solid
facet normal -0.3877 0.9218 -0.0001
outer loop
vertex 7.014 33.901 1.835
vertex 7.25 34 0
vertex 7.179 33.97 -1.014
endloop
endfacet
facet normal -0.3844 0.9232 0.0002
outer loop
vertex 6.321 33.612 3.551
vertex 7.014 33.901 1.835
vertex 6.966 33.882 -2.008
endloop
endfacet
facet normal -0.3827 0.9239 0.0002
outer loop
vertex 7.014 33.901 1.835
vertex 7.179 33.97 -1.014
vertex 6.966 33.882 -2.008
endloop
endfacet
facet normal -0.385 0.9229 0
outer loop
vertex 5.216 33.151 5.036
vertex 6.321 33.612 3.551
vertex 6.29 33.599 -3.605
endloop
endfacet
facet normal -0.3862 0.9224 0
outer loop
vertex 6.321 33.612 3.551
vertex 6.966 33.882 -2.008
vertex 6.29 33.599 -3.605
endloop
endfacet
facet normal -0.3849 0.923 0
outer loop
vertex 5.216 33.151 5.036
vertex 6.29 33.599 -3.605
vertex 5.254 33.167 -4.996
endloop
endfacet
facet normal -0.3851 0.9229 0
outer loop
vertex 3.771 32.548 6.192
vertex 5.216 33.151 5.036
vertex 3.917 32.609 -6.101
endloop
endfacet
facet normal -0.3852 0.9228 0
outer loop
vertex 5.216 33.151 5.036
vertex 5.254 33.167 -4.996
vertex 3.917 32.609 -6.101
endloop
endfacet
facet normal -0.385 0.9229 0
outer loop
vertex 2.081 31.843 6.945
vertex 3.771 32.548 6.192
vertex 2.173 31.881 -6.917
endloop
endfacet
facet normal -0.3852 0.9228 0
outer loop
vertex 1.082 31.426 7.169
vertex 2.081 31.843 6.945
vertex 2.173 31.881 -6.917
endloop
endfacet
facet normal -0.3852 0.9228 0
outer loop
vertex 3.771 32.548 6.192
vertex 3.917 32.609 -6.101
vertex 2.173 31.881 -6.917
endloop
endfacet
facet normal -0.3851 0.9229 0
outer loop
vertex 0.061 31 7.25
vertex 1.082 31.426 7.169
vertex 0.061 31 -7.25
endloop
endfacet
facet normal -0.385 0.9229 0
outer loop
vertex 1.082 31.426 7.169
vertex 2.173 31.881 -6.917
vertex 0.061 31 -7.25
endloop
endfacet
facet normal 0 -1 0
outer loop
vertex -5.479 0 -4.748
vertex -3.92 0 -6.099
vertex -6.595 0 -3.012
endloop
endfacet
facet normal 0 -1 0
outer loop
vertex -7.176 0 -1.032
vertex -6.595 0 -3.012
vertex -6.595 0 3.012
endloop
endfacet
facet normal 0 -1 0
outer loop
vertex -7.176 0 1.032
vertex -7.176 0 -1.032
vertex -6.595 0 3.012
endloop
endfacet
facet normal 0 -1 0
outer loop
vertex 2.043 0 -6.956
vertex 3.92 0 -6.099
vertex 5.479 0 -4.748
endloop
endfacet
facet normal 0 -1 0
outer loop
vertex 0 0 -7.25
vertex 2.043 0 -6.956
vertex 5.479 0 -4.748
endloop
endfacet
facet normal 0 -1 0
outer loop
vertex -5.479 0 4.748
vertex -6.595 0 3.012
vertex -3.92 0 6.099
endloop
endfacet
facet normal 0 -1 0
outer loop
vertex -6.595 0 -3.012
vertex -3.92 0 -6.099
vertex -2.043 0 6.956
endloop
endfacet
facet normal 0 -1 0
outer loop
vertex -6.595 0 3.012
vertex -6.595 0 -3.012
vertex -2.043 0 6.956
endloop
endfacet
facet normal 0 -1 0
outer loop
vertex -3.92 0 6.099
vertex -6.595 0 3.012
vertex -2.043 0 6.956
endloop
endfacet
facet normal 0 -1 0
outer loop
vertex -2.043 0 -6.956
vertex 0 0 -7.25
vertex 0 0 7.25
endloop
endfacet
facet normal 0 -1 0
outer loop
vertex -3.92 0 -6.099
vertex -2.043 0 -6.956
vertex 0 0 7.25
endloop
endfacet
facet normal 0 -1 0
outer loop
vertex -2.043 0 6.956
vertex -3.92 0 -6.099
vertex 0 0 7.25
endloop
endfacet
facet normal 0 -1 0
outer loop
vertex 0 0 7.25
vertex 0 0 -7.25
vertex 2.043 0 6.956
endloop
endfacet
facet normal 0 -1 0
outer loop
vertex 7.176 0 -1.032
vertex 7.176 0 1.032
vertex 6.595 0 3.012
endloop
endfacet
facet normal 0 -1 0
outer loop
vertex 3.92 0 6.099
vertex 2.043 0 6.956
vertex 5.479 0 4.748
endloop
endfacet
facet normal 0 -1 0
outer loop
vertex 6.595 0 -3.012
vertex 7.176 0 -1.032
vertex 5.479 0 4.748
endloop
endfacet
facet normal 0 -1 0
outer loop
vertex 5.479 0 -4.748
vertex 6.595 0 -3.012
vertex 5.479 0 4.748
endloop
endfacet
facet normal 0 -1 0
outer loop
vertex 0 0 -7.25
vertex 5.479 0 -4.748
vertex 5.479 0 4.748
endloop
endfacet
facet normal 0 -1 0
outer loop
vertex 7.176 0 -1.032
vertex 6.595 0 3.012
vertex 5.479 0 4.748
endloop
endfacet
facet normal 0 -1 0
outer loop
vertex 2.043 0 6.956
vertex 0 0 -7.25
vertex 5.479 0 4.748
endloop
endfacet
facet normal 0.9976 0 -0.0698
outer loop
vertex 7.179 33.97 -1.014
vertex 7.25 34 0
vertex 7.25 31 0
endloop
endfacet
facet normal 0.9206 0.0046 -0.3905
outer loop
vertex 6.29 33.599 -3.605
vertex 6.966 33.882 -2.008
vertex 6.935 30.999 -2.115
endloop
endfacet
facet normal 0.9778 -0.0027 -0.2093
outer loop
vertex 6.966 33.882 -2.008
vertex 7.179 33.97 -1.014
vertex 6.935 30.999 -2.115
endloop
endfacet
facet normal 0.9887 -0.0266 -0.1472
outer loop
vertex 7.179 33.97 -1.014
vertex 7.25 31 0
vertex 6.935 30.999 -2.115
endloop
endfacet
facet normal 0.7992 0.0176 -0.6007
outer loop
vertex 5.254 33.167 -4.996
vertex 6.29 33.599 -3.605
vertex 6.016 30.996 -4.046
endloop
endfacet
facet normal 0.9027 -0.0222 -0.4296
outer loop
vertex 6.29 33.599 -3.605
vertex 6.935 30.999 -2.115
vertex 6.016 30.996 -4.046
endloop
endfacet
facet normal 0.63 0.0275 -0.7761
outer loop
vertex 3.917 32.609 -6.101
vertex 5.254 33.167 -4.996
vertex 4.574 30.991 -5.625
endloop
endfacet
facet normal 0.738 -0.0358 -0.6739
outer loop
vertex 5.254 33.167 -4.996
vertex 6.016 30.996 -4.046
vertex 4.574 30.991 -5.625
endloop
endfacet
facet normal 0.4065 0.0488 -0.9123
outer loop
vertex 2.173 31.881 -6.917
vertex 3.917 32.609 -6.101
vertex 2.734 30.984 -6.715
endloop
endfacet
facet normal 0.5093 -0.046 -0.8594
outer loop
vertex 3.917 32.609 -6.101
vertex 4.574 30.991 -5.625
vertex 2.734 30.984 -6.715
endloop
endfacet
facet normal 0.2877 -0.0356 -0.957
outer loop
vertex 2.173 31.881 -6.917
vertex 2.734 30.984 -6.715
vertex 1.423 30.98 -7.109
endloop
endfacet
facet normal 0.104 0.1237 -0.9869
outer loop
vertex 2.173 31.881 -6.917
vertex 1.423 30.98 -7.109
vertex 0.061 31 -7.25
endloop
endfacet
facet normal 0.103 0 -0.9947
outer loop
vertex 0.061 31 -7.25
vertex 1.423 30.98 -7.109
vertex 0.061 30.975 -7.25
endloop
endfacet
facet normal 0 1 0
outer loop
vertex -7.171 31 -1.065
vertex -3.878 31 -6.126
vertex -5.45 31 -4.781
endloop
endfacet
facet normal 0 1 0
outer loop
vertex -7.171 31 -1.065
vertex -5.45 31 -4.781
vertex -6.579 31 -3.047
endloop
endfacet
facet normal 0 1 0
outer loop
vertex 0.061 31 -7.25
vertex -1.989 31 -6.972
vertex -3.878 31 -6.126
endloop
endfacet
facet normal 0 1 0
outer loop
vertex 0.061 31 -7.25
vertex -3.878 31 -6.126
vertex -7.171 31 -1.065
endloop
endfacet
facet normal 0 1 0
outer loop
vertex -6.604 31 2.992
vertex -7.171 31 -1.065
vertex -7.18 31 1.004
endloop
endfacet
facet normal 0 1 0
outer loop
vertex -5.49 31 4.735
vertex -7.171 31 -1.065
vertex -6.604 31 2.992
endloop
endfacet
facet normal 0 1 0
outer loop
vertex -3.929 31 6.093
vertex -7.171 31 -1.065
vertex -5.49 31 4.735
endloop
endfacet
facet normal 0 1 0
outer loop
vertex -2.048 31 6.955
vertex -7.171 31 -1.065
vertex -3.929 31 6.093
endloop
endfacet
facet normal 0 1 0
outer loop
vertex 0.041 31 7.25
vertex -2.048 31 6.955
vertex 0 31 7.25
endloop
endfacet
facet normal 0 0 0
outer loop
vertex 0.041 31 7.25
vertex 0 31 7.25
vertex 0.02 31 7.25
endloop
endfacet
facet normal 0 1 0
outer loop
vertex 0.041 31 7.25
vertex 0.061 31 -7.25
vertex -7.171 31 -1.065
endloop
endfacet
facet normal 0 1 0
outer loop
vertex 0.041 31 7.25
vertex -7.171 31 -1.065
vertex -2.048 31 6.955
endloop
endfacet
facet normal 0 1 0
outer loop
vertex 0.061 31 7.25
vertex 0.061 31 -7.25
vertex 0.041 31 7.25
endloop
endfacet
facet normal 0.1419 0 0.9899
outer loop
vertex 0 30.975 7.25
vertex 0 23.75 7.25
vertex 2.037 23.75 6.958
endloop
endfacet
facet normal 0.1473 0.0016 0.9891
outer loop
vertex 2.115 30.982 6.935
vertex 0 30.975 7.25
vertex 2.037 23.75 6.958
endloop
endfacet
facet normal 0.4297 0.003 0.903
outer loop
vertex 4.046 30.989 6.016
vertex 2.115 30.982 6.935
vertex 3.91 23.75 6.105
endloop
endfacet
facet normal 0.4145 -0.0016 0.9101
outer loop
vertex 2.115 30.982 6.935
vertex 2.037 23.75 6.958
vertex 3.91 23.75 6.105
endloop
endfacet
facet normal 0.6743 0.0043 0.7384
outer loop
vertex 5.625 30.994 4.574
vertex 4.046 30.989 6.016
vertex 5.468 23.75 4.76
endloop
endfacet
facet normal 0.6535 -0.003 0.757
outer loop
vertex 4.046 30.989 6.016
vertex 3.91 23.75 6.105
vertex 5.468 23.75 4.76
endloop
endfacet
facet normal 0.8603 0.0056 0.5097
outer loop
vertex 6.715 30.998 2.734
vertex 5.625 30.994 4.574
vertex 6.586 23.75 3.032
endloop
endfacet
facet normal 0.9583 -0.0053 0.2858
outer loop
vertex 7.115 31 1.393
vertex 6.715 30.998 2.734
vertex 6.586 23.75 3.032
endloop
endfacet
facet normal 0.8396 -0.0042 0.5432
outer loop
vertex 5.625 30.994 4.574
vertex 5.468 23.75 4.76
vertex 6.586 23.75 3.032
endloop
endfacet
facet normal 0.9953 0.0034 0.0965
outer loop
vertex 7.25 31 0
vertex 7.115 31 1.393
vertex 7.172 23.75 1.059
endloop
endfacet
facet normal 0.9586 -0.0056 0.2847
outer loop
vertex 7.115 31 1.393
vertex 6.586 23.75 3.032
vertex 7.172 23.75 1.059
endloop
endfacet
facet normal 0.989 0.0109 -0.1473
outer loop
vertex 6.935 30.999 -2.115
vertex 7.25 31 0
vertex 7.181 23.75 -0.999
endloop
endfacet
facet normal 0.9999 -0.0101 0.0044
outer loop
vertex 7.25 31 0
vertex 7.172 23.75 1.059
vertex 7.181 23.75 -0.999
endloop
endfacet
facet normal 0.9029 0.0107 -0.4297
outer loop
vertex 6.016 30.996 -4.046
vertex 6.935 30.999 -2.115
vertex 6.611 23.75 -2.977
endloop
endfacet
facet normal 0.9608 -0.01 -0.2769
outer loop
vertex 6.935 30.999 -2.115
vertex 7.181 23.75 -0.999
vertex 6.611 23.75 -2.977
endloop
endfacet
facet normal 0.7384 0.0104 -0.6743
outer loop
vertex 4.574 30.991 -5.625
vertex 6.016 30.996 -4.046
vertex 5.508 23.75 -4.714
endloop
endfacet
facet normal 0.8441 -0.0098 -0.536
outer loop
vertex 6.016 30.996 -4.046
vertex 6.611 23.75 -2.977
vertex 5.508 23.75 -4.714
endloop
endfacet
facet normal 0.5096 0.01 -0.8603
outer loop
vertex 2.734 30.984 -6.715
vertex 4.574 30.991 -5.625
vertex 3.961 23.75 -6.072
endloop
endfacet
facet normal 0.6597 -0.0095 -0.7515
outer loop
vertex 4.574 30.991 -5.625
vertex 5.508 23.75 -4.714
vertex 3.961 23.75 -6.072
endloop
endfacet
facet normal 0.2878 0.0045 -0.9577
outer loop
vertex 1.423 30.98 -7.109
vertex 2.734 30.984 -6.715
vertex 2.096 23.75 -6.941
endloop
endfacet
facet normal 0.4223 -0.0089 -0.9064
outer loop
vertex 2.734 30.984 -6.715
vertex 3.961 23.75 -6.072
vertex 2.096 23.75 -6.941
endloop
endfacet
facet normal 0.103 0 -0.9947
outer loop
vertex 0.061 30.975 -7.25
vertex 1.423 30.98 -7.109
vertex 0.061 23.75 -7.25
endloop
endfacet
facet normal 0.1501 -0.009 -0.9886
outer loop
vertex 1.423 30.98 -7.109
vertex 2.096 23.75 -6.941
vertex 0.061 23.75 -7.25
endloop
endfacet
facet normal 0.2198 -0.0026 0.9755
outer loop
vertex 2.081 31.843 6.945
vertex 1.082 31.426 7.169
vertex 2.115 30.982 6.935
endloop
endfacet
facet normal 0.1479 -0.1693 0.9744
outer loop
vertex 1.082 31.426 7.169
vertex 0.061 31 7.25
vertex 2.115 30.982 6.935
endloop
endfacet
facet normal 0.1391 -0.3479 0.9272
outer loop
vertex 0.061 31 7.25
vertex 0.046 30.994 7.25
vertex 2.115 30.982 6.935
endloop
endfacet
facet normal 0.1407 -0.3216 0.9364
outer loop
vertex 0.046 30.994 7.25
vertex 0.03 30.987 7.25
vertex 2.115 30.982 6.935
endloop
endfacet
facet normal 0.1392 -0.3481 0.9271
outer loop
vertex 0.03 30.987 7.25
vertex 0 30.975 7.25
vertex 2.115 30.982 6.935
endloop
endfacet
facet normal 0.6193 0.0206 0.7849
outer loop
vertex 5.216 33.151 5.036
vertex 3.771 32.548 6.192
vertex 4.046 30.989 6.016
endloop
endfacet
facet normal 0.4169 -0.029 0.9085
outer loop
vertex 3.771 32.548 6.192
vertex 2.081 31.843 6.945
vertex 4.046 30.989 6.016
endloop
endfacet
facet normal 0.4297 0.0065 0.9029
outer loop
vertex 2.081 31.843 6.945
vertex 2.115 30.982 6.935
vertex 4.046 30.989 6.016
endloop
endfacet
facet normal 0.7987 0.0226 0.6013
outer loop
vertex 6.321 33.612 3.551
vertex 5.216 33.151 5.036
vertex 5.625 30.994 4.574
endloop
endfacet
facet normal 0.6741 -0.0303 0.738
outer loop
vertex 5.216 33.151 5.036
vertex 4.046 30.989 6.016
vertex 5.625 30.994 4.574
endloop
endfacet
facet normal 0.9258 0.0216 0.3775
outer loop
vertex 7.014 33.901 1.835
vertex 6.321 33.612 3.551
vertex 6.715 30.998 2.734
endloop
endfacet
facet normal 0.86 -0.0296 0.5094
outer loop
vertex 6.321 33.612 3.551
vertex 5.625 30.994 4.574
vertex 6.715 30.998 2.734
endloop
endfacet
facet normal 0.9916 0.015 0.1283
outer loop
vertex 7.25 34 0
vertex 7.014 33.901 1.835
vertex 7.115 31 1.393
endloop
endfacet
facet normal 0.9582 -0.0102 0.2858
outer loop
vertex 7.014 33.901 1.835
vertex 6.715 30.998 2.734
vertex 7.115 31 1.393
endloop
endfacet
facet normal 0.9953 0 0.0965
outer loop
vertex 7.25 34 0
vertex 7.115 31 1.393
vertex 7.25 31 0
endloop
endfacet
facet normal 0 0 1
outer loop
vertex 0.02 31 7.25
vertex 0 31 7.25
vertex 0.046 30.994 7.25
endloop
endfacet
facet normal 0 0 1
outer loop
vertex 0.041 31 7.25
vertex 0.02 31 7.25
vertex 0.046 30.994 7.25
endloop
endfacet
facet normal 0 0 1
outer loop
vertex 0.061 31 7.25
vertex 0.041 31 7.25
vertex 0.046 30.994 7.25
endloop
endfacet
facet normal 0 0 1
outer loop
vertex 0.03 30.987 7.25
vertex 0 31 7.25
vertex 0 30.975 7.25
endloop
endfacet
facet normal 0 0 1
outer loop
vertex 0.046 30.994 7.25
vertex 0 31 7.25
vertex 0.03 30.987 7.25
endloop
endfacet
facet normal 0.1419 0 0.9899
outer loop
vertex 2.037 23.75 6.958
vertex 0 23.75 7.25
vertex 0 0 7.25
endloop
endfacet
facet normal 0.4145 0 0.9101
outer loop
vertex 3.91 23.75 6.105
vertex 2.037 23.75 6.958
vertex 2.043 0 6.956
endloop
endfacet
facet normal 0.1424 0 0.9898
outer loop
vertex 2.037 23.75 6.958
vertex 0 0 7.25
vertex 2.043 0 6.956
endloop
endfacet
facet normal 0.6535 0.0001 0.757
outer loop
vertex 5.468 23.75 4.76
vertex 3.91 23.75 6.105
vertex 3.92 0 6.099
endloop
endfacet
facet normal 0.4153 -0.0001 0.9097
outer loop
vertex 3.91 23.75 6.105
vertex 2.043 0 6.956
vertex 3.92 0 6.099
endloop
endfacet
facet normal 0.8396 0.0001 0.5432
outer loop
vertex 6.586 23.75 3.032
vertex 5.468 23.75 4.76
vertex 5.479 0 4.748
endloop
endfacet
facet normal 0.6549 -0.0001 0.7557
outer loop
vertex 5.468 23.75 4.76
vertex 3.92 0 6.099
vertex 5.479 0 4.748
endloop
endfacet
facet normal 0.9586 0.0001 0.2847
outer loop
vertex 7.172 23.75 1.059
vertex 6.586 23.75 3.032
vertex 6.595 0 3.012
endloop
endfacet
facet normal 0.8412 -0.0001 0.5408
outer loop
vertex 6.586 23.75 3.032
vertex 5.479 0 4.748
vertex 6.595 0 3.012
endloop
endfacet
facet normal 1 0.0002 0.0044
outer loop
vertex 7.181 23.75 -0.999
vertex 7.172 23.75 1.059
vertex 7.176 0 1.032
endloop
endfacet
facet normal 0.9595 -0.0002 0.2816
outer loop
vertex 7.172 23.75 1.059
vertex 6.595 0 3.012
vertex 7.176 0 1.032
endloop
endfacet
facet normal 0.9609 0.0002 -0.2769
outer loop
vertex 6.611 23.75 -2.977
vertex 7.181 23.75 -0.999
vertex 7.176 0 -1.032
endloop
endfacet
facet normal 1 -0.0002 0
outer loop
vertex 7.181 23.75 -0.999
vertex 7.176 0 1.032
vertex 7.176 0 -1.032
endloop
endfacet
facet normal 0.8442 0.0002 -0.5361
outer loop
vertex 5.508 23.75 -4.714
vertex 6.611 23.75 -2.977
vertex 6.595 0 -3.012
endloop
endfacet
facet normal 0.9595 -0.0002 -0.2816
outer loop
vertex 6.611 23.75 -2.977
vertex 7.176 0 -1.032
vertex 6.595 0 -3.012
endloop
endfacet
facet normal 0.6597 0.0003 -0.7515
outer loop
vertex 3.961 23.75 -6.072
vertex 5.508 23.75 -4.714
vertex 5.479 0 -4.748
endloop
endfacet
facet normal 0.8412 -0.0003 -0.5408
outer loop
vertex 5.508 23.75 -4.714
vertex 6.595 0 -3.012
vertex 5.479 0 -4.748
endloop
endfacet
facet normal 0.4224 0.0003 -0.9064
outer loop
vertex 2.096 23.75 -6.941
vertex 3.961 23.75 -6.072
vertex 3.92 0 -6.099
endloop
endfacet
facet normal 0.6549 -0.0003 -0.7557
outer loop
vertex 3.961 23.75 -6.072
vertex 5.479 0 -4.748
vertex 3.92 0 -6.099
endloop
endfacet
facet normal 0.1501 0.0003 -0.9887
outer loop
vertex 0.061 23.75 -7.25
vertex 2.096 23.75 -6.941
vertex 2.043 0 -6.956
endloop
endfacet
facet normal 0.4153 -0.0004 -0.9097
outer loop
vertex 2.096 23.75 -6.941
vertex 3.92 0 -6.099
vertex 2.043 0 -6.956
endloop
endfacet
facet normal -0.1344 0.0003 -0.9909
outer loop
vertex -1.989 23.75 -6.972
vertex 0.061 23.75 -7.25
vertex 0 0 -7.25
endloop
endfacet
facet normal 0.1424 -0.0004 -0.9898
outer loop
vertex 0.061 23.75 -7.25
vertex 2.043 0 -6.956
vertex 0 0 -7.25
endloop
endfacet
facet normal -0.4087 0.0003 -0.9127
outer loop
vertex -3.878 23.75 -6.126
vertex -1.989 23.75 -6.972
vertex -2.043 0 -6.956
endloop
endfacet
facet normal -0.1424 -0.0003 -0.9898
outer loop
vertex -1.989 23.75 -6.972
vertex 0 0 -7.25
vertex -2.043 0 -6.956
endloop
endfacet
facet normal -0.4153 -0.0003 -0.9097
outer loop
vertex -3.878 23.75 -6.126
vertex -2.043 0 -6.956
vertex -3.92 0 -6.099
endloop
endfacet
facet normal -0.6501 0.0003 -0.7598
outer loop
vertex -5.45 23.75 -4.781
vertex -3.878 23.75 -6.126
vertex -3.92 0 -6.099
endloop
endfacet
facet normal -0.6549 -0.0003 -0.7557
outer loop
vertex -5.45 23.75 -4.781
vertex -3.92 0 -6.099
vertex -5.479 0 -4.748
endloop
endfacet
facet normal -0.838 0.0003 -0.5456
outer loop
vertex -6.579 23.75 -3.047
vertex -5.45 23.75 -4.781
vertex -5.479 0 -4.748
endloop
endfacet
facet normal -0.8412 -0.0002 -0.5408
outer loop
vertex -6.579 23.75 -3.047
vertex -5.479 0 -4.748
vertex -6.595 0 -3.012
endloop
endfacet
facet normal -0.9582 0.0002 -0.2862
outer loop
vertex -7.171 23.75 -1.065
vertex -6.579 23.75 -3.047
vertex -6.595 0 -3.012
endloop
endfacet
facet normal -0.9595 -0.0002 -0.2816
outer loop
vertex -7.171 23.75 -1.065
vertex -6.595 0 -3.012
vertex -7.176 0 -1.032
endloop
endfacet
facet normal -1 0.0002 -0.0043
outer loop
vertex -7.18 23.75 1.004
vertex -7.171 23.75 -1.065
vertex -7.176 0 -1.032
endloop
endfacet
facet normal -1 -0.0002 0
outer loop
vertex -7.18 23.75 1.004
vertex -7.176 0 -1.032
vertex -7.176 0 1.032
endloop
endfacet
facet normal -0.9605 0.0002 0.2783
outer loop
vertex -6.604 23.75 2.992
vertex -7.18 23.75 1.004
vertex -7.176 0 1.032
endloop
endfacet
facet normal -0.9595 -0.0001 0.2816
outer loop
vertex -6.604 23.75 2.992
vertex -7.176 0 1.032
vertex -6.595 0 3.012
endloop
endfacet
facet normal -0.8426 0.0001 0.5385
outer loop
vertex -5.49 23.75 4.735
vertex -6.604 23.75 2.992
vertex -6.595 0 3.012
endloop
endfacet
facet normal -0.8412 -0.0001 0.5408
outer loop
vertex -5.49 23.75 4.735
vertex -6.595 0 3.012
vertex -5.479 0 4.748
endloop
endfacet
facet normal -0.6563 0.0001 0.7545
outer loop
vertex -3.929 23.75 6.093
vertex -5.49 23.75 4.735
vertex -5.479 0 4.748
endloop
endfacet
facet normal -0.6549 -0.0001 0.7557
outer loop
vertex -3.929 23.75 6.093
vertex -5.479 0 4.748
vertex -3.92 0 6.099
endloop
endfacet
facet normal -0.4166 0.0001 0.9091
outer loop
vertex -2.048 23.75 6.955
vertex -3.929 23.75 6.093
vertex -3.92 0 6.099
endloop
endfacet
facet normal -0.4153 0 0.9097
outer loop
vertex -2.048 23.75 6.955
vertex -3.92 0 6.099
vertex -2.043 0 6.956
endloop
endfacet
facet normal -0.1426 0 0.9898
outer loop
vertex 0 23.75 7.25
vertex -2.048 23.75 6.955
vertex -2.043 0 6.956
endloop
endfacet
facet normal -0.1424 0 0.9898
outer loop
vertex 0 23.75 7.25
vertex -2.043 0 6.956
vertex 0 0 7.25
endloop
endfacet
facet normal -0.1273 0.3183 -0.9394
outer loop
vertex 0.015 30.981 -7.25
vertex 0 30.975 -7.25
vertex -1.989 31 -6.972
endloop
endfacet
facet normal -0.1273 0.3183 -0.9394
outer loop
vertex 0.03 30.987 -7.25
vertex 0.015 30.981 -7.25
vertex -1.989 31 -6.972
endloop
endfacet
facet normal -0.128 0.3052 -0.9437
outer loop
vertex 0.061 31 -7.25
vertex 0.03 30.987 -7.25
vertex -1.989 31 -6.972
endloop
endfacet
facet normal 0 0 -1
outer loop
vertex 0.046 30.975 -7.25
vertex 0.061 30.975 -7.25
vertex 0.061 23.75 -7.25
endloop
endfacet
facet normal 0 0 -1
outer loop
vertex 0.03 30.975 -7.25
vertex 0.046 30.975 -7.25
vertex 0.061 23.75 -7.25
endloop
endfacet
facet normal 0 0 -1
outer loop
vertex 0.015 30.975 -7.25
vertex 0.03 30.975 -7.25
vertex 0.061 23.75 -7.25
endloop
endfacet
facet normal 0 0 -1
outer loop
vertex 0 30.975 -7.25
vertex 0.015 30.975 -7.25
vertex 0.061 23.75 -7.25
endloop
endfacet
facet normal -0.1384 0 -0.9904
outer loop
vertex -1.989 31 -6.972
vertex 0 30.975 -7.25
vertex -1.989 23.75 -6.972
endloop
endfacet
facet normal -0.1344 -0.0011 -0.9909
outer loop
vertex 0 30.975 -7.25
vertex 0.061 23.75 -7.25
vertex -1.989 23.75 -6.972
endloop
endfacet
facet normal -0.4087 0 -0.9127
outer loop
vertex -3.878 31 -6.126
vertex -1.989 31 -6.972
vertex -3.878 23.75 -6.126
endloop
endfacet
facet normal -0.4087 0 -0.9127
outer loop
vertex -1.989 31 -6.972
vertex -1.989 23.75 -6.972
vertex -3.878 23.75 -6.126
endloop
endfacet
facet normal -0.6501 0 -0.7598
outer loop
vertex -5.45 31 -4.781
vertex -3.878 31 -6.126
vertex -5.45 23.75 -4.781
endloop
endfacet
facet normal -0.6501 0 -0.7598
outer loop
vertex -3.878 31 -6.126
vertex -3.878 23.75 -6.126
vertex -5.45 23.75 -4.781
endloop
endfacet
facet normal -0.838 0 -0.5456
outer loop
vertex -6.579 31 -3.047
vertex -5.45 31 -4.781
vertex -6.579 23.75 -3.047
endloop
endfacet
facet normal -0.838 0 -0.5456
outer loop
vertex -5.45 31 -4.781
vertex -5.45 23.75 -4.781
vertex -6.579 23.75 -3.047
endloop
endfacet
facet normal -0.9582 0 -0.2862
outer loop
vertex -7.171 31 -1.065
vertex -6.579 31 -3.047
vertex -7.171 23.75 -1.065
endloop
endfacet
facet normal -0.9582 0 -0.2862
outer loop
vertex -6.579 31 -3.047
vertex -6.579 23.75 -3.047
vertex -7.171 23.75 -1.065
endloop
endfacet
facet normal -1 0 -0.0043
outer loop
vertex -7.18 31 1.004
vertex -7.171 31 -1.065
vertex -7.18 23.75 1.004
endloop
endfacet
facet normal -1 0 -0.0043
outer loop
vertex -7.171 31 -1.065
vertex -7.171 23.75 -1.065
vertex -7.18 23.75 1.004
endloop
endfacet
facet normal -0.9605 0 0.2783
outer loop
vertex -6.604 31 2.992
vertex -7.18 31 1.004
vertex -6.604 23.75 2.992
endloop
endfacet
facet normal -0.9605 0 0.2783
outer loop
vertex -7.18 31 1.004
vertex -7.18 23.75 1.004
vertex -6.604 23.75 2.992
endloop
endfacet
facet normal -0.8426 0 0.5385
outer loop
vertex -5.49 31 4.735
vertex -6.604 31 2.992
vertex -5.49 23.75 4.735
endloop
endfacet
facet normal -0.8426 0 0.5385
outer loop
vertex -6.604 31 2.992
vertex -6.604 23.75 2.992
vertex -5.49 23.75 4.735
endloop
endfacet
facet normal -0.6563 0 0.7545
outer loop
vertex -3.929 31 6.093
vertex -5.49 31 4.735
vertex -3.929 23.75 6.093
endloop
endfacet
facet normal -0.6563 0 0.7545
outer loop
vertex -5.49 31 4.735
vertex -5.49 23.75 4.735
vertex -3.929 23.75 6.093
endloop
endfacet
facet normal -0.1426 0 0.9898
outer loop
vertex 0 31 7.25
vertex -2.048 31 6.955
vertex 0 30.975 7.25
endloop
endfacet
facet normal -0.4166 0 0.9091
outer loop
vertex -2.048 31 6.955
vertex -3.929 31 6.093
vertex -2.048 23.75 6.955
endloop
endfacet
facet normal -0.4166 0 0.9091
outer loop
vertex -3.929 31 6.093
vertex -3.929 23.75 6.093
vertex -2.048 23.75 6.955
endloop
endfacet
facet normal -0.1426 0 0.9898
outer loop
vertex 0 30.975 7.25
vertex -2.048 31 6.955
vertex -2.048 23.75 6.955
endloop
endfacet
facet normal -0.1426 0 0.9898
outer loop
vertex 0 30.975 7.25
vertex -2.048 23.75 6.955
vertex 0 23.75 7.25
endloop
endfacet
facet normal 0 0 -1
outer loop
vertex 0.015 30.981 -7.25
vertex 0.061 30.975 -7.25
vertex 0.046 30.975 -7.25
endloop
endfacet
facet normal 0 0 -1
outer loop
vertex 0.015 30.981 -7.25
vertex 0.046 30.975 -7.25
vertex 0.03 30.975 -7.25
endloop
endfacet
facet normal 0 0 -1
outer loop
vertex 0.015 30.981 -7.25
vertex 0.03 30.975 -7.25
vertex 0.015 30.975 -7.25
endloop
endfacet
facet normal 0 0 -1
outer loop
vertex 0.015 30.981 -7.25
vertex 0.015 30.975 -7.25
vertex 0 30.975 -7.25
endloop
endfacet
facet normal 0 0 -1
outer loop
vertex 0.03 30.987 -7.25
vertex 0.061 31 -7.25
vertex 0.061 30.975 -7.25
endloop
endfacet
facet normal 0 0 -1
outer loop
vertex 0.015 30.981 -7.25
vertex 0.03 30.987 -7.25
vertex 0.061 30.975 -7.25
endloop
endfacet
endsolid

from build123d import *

# Parameters (mm, degrees)
SKETCH1_R                = 7.25
BOSS_EXTRUDE1_DEPTH      = 31
BOSS_EXTRUDE2_DEPTH      = 7.25
BOSS_EXTRUDE2_DEPTH_BACK = 7.25
CUT_EXTRUDE1_DEPTH       = 7.25
CUT_EXTRUDE1_DEPTH_BACK  = 7.25
SKETCH3_R                = 10.663559867
SKETCH3_R_2              = 7.25


with BuildPart() as part:
    # Sketch1 → Boss-Extrude1 (new body)
    with BuildSketch(Plane(origin=(0, 0, 0), x_dir=(1, 0, 0), z_dir=(0, 1, 0))):
        Circle(SKETCH1_R)
    extrude(amount=BOSS_EXTRUDE1_DEPTH)

    # Sketch2 → Boss-Extrude2 (add, two sides: drawn at the far end of the back side and taken through both)
    with BuildSketch(Plane.XY.offset(-BOSS_EXTRUDE2_DEPTH_BACK)):
        Polygon((0, 30.974625455), (7.25, 31), (7.25, 34), align=None)
    extrude(amount=BOSS_EXTRUDE2_DEPTH + BOSS_EXTRUDE2_DEPTH_BACK)

    # Sketch3 → Cut-Extrude1 (cut, two sides: drawn at the far end of the back side and taken through both)
    with BuildSketch(Plane(origin=(0, 31, 0), x_dir=(1, 0, 0), z_dir=(0, 1, 0)).offset(-CUT_EXTRUDE1_DEPTH_BACK)):
        Circle(SKETCH3_R)
        Circle(SKETCH3_R_2, mode=Mode.SUBTRACT)
    extrude(amount=CUT_EXTRUDE1_DEPTH + CUT_EXTRUDE1_DEPTH_BACK, mode=Mode.SUBTRACT)


solid = part.part
